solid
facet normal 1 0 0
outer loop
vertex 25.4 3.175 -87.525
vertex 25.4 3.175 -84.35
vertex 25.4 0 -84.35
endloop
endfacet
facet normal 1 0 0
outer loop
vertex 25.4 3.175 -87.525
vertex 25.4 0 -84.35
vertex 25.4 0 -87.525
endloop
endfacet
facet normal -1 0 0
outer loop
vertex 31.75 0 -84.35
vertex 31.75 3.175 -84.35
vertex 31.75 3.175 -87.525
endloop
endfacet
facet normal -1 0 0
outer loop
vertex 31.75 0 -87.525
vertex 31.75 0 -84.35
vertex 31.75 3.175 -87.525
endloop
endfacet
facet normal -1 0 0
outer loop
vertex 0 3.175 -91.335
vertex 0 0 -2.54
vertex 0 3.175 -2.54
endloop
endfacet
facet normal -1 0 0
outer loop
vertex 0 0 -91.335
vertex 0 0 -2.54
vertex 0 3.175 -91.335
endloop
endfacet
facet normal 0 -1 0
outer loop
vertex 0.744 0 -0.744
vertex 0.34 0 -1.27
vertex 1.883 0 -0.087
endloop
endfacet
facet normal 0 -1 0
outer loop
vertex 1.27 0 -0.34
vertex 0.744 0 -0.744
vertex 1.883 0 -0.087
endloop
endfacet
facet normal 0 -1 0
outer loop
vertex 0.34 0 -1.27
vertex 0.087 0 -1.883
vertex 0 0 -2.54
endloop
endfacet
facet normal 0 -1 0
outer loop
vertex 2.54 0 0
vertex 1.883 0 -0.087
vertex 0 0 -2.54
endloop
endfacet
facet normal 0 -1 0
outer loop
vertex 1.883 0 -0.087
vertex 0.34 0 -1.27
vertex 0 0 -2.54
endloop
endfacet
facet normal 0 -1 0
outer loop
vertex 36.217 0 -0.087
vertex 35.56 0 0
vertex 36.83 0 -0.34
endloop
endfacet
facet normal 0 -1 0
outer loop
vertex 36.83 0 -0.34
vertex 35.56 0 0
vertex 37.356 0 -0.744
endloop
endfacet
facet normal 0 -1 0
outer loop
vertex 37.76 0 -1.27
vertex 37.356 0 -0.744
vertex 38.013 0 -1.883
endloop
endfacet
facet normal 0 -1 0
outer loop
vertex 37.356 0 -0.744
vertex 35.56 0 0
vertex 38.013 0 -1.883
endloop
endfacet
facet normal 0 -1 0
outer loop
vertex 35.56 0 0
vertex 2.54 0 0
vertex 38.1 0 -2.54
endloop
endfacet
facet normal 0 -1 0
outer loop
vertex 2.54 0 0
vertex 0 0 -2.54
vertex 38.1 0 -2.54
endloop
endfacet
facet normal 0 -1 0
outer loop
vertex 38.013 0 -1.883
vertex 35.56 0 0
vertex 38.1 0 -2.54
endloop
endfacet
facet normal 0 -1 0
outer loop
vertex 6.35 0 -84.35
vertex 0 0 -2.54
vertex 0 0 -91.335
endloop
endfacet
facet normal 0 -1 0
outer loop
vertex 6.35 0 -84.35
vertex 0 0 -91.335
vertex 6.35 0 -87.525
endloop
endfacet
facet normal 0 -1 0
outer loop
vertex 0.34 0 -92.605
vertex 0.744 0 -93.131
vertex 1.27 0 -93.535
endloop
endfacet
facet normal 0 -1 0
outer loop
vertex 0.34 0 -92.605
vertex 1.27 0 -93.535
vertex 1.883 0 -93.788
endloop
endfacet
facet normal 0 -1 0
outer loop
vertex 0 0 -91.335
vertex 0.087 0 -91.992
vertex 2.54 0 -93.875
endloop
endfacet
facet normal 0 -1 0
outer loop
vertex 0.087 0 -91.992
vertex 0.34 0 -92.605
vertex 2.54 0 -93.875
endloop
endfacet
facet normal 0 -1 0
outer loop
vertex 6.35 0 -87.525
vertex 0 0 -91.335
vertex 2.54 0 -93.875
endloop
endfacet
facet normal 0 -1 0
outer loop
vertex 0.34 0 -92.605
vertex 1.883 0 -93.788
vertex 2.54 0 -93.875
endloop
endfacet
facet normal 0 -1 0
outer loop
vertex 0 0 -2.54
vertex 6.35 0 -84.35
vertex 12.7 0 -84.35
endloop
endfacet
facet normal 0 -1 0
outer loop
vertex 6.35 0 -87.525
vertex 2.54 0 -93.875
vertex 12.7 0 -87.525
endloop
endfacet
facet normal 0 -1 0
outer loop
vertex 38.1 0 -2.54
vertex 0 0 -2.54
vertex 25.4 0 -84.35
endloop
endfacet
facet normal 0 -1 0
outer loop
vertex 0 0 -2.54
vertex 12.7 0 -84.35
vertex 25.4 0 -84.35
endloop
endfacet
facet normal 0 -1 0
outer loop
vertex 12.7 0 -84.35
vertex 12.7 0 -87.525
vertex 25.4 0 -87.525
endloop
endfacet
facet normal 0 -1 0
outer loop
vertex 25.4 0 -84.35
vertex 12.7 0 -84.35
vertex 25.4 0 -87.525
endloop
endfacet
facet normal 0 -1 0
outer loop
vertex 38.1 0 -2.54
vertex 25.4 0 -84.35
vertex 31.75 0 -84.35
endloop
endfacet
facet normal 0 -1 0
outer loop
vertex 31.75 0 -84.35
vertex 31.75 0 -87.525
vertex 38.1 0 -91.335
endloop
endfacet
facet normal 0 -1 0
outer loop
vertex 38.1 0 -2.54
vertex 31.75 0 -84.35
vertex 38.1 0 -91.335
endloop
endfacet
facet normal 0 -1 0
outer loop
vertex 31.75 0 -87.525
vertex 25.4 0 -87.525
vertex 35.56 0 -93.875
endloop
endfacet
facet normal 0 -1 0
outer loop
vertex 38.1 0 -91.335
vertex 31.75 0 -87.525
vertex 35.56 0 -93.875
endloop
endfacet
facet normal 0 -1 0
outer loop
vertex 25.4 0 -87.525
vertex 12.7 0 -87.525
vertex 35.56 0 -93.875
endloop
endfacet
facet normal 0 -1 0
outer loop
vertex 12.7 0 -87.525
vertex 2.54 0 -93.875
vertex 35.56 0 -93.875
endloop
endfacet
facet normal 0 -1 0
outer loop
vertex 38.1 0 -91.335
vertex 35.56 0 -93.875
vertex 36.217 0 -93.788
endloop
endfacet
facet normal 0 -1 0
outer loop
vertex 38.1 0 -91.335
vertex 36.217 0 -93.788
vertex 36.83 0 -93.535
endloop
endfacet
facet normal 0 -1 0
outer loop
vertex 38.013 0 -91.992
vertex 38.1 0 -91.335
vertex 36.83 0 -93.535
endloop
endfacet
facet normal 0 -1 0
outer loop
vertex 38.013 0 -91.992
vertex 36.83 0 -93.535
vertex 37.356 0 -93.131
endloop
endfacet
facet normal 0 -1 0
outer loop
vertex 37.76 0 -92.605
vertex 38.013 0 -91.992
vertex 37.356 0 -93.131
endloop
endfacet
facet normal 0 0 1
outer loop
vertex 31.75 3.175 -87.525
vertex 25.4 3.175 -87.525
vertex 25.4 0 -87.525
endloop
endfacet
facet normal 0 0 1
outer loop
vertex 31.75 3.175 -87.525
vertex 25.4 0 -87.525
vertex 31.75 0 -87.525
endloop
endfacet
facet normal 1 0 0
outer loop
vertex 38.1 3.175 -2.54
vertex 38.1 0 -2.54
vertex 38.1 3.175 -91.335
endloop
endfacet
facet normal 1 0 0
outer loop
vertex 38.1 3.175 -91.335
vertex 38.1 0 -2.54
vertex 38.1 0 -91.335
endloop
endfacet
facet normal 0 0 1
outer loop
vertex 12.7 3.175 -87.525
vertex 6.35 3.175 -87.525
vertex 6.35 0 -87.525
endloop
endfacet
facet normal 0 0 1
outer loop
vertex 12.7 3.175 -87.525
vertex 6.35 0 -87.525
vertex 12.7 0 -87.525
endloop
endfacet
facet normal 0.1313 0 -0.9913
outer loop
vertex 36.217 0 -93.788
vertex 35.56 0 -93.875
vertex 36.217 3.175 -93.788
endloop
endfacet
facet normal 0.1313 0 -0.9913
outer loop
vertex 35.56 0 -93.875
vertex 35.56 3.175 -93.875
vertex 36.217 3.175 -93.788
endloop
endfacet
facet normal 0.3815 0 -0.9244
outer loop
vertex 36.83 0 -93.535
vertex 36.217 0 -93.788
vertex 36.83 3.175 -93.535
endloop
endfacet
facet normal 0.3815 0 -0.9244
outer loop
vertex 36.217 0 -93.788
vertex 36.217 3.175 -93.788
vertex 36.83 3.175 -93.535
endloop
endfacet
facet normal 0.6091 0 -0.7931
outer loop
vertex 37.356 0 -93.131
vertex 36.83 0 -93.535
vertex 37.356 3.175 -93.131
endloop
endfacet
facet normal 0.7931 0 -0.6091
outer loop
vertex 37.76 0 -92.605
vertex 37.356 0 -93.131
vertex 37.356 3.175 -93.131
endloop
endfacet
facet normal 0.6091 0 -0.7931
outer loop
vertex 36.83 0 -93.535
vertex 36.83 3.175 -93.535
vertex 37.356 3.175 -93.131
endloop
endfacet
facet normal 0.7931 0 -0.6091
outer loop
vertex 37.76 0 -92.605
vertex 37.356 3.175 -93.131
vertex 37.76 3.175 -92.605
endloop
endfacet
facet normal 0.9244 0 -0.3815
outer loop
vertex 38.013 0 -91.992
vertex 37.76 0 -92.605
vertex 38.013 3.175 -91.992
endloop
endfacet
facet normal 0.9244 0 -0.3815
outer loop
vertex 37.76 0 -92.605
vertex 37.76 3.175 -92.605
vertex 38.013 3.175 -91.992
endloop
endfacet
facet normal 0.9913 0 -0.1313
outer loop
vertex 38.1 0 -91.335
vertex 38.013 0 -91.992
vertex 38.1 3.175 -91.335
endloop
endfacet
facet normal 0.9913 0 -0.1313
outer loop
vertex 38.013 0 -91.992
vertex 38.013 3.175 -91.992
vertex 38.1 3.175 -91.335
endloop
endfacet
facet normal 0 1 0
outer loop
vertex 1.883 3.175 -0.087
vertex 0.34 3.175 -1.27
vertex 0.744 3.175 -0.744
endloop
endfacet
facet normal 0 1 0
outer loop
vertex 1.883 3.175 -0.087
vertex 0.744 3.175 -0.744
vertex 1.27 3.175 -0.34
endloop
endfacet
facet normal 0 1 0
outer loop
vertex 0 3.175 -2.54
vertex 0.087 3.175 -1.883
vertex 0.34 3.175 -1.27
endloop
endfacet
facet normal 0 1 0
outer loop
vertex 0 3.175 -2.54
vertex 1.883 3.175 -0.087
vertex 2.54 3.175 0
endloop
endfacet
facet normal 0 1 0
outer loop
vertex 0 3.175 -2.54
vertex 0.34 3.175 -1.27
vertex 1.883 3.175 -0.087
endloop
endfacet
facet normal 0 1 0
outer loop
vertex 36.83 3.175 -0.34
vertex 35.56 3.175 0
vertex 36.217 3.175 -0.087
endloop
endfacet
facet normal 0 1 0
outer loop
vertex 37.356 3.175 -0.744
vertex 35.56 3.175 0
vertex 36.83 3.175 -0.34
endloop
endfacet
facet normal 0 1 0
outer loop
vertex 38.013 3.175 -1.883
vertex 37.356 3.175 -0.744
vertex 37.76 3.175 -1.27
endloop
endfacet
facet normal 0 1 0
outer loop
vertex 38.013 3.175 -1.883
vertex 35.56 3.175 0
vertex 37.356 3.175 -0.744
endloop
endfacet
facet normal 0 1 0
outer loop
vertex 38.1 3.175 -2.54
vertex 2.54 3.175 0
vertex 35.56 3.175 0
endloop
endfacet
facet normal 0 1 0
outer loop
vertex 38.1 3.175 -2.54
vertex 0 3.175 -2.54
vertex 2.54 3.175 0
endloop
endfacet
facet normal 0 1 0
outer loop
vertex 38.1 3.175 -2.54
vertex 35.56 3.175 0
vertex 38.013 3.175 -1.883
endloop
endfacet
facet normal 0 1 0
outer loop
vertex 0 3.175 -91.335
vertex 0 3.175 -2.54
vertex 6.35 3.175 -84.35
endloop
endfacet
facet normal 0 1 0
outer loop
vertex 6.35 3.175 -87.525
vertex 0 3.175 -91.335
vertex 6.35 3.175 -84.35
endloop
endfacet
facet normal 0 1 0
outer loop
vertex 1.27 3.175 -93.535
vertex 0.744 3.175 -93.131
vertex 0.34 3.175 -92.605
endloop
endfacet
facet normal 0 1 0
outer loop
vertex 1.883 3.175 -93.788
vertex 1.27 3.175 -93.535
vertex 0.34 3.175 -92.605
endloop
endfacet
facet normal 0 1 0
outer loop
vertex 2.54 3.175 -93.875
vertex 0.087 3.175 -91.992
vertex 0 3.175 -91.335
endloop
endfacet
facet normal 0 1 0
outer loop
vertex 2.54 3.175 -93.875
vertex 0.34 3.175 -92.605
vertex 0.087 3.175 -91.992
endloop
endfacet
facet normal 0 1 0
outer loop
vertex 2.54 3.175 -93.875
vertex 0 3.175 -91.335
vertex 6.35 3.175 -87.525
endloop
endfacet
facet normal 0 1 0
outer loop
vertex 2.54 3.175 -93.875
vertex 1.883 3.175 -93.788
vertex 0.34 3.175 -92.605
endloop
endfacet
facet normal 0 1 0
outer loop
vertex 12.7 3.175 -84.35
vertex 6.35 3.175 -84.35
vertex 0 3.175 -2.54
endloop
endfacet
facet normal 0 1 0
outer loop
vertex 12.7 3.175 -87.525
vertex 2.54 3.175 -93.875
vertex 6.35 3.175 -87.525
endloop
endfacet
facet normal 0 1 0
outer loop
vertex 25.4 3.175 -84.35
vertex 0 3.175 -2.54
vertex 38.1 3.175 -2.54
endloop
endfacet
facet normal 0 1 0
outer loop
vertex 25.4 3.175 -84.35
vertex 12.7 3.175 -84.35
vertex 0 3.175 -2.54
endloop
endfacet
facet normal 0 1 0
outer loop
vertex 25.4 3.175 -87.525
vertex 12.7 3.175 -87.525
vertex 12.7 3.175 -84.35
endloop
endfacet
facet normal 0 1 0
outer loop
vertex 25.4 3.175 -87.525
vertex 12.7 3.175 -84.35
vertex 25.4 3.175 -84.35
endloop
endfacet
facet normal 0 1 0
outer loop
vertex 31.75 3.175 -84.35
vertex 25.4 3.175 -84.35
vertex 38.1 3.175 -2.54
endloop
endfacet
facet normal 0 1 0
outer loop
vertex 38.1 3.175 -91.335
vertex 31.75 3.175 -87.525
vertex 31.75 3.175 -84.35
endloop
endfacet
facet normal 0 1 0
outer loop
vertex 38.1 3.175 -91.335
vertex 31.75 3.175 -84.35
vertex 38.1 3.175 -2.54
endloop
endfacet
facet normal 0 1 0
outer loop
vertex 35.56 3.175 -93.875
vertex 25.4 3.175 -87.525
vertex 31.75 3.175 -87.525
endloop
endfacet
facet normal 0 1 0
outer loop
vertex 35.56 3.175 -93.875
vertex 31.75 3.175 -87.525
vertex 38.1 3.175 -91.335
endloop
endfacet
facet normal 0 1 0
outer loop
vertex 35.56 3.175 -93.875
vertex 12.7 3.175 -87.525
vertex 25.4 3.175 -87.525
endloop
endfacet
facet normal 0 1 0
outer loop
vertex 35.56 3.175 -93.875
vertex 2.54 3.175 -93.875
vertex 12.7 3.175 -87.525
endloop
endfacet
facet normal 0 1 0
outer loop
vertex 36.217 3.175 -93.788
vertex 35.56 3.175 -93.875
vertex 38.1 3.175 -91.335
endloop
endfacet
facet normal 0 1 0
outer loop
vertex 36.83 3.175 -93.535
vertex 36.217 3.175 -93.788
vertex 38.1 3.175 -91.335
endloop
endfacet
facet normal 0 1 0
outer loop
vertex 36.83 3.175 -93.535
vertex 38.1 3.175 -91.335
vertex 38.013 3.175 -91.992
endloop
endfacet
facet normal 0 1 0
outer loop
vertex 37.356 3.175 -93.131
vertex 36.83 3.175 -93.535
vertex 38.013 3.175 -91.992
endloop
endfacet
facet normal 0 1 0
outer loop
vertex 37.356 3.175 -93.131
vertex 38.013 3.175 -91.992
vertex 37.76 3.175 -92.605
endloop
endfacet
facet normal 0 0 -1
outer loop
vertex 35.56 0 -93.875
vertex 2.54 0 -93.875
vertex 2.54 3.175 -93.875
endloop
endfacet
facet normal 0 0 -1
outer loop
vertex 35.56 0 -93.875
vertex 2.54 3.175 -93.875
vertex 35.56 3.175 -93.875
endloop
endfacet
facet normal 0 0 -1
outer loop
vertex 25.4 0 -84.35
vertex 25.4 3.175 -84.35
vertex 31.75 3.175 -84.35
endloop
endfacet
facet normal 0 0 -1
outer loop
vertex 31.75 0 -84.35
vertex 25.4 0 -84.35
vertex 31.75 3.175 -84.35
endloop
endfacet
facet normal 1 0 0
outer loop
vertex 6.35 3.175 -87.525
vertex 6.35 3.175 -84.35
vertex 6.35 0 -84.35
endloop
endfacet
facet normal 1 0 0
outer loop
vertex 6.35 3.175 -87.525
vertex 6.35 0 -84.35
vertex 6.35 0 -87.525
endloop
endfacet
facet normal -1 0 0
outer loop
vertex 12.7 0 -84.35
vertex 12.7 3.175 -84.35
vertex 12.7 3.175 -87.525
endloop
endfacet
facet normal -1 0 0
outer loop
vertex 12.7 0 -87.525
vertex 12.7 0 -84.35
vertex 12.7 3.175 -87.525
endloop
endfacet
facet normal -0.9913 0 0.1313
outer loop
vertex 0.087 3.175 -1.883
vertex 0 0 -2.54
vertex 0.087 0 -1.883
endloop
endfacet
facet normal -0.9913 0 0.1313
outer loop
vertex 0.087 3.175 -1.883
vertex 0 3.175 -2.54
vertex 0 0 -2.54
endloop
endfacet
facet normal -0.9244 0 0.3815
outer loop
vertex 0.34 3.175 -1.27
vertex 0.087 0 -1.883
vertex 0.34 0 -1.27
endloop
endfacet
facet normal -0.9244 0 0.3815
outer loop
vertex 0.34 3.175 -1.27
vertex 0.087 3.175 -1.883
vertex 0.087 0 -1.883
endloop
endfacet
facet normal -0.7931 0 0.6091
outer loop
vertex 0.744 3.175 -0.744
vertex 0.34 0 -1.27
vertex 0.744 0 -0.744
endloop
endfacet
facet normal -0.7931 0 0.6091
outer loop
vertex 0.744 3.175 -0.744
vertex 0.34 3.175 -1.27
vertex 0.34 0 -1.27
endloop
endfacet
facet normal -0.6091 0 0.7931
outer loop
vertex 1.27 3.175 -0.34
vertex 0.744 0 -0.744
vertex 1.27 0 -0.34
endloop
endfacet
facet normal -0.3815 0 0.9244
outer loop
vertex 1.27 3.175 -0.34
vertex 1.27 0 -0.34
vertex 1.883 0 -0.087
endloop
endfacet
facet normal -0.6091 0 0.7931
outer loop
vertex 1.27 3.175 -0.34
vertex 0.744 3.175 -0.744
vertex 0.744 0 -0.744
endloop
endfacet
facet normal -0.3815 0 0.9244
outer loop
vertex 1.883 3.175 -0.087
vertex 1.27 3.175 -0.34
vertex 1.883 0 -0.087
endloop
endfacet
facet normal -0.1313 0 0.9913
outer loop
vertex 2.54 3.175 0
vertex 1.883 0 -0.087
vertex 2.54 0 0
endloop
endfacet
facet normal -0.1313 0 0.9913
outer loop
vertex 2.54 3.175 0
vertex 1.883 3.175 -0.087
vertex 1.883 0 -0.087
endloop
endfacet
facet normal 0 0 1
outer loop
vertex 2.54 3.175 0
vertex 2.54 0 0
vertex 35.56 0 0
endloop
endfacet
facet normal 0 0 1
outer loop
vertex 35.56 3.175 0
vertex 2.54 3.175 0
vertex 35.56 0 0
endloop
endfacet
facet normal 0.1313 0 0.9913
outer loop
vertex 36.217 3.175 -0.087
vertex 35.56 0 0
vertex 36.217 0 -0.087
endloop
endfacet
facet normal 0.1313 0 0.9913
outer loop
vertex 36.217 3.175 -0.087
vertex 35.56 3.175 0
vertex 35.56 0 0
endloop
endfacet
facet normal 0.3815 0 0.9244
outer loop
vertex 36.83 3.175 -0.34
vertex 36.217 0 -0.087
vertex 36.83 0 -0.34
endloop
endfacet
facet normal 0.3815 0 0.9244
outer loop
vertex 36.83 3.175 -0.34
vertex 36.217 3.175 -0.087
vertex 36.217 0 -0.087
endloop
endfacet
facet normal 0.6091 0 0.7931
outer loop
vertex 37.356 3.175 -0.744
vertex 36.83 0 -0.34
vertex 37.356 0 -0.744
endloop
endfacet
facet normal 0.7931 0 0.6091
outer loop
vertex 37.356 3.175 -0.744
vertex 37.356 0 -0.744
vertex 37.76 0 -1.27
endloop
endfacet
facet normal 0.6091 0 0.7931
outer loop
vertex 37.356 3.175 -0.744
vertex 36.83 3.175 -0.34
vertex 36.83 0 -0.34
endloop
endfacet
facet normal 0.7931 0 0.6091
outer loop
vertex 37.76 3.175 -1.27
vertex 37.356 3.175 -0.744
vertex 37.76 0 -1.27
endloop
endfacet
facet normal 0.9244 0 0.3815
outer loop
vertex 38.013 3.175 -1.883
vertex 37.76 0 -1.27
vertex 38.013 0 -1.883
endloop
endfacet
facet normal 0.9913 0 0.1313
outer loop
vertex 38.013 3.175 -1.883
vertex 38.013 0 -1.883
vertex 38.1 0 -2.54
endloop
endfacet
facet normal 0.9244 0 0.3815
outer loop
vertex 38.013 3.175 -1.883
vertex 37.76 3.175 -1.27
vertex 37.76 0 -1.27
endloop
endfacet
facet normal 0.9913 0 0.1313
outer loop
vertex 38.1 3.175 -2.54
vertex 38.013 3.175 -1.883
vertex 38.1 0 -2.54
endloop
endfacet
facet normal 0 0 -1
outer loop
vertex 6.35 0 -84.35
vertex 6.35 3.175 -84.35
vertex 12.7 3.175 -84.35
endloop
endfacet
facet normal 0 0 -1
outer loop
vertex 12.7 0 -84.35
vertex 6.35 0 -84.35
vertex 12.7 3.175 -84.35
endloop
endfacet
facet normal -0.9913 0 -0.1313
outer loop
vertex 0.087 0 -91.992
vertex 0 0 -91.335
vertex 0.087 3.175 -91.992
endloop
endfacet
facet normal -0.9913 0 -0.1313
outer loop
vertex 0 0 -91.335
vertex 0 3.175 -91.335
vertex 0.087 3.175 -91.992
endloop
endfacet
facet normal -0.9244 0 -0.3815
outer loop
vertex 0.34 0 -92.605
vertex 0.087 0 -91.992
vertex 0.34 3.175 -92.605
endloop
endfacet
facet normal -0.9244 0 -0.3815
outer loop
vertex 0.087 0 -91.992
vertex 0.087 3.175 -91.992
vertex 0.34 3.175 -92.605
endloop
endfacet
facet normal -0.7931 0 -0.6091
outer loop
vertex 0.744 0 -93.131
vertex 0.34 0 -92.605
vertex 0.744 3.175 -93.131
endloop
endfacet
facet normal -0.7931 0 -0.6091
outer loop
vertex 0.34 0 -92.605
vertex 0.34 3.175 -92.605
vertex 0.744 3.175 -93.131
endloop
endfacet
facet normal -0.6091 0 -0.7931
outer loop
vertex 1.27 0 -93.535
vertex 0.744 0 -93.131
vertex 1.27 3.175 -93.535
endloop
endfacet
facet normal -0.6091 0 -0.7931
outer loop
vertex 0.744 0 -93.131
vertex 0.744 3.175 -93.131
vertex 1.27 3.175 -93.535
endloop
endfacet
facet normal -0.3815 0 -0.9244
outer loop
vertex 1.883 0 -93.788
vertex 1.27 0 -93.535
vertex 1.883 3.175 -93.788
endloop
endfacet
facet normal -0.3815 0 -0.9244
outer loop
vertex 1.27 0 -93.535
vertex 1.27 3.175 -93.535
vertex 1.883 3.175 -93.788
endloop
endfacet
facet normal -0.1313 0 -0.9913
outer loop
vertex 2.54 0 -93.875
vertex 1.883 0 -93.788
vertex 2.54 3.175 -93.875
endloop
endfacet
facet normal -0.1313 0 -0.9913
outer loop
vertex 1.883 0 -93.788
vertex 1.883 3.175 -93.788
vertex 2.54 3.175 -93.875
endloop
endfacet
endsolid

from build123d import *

# Parameters (mm, degrees)
SKETCH1_W           = 38.1
SKETCH1_H           = 93.875
BOSS_EXTRUDE1_DEPTH = 3.175
SKETCH2_W           = 6.35
SKETCH2_H           = 3.175
CUT_EXTRUDE1_DEPTH  = 102.361759308
FILLET1_R           = 2.54


with BuildPart() as part:
    # Sketch1 → Boss-Extrude1 (new body)
    with BuildSketch(Plane(origin=(0, 0, 0), x_dir=(1, 0, 0), z_dir=(0, 1, 0))):
        with Locations((19.05, 46.9375)):
            Rectangle(SKETCH1_W, SKETCH1_H)
    extrude(amount=BOSS_EXTRUDE1_DEPTH)

    # Sketch2 → Cut-Extrude1 (cut, through all)
    with BuildSketch(Plane(origin=(0, 3.175, 0), x_dir=(1, 0, 0), z_dir=(0, 1, 0))):
        with Locations((9.525, 85.9375)):
            Rectangle(SKETCH2_W, SKETCH2_H)
        with Locations((28.575, 85.9375)):
            Rectangle(SKETCH2_W, SKETCH2_H)
    extrude(amount=-CUT_EXTRUDE1_DEPTH, mode=Mode.SUBTRACT)

    # Fillet1
    fillet1_edges = [part.edges().sort_by_distance(p)[0] for p in [
        (0, 1.5875, -93.875),
        (38.1, 1.5875, -93.875),
        (38.1, 1.5875, 0),
        (0, 1.5875, 0),
    ]]
    fillet(fillet1_edges, radius=FILLET1_R)


solid = part.part
